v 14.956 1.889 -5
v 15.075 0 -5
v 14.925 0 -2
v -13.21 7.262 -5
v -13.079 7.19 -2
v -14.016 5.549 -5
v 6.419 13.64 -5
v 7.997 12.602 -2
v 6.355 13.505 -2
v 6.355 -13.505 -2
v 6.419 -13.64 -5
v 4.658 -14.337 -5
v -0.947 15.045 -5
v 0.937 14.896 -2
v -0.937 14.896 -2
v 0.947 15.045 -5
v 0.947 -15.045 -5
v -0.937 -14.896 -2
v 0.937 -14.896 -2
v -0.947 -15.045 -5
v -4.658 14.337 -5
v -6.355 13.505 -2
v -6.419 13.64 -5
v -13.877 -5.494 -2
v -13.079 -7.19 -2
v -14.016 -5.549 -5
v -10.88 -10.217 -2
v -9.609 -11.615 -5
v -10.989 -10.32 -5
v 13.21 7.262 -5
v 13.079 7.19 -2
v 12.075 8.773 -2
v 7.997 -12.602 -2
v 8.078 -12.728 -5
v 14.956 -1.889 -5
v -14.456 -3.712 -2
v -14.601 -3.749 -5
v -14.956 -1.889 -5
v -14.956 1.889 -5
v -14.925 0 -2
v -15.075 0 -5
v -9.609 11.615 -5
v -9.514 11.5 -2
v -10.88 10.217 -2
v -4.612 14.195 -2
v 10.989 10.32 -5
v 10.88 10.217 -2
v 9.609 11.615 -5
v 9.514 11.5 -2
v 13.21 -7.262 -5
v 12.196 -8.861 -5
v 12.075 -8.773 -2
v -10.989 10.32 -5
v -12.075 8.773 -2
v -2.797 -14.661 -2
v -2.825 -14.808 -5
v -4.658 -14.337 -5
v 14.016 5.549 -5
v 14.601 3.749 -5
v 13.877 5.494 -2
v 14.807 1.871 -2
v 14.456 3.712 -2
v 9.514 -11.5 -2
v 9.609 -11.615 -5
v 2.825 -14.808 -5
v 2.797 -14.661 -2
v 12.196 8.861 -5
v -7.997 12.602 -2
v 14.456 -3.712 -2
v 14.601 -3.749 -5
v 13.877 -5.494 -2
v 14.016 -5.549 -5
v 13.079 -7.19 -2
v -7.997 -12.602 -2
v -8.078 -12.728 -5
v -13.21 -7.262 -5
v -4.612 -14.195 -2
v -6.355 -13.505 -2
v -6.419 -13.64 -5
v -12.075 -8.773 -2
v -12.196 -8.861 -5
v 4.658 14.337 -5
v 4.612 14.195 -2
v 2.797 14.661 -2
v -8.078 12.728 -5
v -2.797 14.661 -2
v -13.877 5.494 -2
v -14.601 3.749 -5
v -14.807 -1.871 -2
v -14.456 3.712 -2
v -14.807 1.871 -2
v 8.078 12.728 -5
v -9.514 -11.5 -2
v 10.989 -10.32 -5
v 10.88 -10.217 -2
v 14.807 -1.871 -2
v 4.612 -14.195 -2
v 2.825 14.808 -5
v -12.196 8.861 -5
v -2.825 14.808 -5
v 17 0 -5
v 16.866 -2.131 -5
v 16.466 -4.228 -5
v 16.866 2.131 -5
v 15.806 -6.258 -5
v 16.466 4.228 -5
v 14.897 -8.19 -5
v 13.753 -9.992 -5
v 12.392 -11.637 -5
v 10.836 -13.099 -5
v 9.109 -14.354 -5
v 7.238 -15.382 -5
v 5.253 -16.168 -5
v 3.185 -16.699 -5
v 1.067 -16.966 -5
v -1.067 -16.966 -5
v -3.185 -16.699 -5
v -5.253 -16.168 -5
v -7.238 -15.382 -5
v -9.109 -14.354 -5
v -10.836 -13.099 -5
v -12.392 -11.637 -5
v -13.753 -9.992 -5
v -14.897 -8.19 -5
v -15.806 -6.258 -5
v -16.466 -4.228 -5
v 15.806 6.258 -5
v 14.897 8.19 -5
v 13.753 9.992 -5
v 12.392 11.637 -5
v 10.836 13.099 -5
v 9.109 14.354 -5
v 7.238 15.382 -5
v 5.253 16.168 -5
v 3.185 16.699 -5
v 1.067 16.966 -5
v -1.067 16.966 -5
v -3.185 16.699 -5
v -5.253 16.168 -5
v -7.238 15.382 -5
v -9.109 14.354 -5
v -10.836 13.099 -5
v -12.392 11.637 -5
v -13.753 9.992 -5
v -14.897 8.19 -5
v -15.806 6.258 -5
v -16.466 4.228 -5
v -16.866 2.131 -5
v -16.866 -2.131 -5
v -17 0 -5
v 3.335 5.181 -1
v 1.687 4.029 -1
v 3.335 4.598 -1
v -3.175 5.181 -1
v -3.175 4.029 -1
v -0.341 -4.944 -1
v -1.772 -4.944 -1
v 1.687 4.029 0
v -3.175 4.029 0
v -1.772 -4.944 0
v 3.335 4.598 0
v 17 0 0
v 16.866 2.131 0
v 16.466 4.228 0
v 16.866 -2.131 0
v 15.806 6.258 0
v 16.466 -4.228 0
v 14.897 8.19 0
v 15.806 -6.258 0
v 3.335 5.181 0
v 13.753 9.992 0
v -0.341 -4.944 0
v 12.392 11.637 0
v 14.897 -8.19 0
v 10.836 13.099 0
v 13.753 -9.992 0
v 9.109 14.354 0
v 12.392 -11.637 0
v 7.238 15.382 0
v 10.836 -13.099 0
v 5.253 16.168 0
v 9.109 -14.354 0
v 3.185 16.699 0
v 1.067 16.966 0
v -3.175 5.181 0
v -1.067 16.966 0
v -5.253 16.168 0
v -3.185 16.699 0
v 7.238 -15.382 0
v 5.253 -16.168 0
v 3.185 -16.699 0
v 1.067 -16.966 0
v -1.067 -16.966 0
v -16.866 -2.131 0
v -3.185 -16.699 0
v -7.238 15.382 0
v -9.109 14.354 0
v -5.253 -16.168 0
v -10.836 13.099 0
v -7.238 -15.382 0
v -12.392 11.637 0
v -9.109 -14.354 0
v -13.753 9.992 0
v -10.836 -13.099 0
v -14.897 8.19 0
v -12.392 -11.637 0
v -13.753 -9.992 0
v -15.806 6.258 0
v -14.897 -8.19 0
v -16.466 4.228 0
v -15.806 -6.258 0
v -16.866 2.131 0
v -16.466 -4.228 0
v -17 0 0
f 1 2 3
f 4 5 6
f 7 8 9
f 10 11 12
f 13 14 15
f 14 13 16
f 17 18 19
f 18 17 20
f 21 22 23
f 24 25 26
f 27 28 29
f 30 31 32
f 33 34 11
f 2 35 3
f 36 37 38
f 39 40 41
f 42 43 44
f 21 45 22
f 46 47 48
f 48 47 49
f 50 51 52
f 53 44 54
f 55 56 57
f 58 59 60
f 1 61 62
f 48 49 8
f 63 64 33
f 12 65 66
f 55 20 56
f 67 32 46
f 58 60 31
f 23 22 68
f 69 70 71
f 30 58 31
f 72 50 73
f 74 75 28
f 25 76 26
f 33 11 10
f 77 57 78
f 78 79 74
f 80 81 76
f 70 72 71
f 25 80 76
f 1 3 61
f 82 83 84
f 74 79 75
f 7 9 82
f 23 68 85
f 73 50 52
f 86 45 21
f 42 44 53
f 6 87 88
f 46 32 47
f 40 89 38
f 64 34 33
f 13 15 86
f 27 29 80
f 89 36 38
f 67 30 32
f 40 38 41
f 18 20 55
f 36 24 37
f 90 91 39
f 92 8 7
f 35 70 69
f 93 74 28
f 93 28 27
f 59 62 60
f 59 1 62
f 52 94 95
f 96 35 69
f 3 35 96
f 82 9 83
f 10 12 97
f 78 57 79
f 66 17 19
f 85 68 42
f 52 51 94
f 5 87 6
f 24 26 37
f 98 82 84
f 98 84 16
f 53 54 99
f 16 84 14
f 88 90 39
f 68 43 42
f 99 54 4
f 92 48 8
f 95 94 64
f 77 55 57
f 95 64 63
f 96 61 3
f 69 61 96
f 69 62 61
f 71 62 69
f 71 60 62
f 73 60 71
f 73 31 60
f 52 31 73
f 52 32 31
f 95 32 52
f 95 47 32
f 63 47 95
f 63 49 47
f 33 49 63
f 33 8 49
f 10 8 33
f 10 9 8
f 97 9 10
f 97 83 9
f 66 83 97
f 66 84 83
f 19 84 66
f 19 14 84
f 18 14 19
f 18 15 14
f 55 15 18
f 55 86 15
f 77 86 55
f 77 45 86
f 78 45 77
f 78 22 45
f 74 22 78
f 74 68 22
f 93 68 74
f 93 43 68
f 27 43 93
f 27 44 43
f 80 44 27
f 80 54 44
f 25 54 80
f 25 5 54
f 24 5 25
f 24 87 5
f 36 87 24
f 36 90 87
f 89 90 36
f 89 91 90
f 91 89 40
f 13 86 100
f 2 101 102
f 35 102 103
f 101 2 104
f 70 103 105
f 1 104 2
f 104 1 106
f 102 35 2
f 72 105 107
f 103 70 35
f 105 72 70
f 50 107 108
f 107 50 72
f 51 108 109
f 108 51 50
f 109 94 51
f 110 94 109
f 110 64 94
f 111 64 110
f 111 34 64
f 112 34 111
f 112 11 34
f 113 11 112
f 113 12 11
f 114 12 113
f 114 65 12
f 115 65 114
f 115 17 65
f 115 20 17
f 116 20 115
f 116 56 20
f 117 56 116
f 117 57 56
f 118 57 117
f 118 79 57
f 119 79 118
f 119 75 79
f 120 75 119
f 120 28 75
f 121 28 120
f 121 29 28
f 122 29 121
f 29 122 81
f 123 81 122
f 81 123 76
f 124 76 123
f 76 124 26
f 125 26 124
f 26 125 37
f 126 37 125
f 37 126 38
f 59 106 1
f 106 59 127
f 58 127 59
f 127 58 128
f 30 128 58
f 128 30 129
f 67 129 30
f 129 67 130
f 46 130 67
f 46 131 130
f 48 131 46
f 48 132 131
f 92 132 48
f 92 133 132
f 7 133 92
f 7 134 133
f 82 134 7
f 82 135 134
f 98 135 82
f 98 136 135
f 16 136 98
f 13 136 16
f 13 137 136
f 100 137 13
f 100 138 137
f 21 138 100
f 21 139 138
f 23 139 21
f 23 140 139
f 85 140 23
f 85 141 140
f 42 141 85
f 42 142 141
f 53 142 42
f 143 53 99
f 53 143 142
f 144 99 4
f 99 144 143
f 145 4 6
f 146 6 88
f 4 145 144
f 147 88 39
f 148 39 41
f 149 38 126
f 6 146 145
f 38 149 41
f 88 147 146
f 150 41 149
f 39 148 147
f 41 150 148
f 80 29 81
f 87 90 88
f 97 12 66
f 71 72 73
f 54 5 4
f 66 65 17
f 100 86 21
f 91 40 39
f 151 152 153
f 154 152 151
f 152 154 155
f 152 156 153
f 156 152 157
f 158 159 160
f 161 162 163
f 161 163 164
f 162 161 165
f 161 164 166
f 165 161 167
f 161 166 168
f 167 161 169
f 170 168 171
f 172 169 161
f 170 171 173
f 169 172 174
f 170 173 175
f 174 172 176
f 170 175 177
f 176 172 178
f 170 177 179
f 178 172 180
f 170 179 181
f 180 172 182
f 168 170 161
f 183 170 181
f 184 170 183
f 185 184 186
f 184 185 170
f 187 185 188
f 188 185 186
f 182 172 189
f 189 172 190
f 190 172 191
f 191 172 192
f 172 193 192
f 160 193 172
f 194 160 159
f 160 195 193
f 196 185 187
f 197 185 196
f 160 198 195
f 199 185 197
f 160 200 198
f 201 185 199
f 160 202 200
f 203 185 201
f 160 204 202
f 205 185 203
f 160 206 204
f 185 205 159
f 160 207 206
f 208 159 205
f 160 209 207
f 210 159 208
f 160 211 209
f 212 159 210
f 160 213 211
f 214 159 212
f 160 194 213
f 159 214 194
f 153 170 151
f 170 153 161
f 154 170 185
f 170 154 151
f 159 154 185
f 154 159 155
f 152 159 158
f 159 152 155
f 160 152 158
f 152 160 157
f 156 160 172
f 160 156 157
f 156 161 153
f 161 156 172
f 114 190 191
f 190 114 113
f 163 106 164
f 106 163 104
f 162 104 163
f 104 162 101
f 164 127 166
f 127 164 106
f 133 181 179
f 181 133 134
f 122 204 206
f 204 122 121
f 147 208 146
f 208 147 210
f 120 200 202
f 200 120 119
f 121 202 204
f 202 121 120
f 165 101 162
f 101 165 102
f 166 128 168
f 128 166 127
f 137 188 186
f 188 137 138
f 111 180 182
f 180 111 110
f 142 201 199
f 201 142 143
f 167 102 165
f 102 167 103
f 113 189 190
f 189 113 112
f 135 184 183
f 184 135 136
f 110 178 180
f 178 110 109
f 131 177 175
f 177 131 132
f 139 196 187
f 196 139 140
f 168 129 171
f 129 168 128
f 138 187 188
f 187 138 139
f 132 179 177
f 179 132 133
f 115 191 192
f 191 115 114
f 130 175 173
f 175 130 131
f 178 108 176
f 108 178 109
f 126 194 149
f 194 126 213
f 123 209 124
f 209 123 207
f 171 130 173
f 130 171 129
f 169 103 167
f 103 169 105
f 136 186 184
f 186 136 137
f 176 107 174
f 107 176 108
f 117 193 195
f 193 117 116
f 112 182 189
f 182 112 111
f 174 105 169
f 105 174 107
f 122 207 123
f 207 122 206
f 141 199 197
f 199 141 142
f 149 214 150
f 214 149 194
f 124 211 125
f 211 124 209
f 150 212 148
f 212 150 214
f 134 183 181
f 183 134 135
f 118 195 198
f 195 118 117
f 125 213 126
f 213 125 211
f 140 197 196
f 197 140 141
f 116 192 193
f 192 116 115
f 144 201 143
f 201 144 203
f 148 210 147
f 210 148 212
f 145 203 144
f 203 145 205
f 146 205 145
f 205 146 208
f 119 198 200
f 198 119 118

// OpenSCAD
$fn = 50;

difference() {
	union() {
		translate(v = [0, 0, -5.0]) {
			cylinder(h = 5, r = 17.0);
		}
	}
	union() {
		#translate(v = [0, 0, -5.0]) {
			cylinder(h = 3, r1 = 15.075, r2 = 14.925);
		}
		translate(v = [0, 0, -1]) {
			linear_extrude(height = 1) {
				text(font = "Impact", halign = "center", size = 10, text = "7", valign = "center");
			}
		}
	}
}
